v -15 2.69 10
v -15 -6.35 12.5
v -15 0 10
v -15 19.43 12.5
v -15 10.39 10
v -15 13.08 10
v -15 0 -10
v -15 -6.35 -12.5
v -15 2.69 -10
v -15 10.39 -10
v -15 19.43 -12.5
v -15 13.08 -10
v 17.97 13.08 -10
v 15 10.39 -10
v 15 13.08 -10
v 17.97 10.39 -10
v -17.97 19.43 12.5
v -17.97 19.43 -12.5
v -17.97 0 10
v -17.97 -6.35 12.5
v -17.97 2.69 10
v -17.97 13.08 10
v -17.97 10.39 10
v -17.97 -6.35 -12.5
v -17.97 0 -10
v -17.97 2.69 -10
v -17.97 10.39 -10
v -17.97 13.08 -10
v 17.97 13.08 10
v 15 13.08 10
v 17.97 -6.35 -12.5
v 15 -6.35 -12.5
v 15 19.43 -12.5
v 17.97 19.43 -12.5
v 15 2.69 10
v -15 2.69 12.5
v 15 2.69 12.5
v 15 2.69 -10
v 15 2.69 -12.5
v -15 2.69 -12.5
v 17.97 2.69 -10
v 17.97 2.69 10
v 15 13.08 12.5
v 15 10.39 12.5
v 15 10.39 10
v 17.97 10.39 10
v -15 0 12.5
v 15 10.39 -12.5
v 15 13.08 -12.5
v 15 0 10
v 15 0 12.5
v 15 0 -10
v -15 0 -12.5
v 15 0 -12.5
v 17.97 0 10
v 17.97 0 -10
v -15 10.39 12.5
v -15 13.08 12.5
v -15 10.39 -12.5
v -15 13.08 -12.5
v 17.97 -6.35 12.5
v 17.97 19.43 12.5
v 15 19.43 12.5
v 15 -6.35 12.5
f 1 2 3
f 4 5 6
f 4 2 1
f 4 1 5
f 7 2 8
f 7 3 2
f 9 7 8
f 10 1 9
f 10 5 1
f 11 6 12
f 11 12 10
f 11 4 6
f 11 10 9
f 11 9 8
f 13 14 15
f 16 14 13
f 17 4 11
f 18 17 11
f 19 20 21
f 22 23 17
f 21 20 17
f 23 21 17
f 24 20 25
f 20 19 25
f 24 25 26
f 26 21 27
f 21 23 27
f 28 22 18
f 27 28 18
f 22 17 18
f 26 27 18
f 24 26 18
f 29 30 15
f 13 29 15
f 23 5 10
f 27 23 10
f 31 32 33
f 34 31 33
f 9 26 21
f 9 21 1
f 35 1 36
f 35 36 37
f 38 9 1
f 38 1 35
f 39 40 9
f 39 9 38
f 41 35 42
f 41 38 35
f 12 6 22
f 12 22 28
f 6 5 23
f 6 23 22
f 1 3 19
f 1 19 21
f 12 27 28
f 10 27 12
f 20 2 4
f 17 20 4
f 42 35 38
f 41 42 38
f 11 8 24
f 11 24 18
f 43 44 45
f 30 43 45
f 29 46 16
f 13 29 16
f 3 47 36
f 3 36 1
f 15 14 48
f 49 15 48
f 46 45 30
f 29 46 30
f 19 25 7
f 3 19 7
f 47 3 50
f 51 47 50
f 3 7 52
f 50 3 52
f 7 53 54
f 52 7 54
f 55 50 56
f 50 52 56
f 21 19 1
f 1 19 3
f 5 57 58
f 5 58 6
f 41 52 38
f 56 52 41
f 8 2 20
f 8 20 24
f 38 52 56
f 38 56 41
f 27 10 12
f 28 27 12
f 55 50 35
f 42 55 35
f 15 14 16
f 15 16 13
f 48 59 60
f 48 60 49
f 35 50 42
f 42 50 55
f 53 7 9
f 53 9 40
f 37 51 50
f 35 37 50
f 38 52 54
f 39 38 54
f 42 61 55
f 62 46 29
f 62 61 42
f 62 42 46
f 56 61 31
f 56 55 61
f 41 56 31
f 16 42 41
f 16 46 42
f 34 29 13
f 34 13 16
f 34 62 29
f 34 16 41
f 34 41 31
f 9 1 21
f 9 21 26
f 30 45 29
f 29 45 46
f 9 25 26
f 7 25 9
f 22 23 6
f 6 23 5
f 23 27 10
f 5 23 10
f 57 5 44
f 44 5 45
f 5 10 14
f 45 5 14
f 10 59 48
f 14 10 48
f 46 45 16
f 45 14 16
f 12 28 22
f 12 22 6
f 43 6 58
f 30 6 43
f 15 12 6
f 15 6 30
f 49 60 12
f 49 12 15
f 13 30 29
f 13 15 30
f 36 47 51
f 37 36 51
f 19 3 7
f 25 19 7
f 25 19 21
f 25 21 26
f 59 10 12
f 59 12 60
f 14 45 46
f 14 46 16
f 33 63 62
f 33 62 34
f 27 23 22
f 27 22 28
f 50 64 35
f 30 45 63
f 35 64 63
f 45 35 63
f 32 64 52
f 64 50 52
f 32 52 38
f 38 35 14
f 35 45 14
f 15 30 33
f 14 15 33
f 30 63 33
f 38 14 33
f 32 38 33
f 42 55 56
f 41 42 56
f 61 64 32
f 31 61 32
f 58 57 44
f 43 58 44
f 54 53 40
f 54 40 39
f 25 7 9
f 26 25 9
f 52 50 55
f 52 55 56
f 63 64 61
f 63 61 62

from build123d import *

# Parameters (mm, degrees)
SKETCH2_W           = 30
SKETCH2_H           = 25
SKETCH2_W_2         = 2.97
SKETCH2_H_2         = 20
BOSS_EXTRUDE3_DEPTH = 2.69
BOSS_EXTRUDE4_START = 10.39
SKETCH2_3_W         = 2.97
SKETCH2_3_H         = 20
SKETCH2_3_W_2       = 30
SKETCH2_3_H_2       = 25
BOSS_EXTRUDE4_DEPTH = 2.69
SKETCH4_W           = 25
SKETCH4_H           = 25.78
SKETCH4_W_2         = 20
SKETCH4_H_2         = 2.69
BOSS_EXTRUDE5_DEPTH = 2.97


with BuildPart() as part:
    # Sketch2 → Boss-Extrude3 (new body)
    with BuildSketch(Plane(origin=(0, 0, 0), x_dir=(1, 0, 0), z_dir=(0, 1, 0))):
        Rectangle(SKETCH2_W, SKETCH2_H)
        with Locations((-16.485, 0)):
            Rectangle(SKETCH2_W_2, SKETCH2_H_2)
        with Locations((16.485, 0)):
            Rectangle(SKETCH2_W_2, SKETCH2_H_2)
    extrude(amount=BOSS_EXTRUDE3_DEPTH)


with BuildPart() as body_2:
    # Sketch2<3> → Boss-Extrude4 (new body)
    with BuildSketch(Plane(origin=(0, 0, 0), x_dir=(1, 0, 0), z_dir=(0, 1, 0)).offset(BOSS_EXTRUDE4_START)):
        with Locations((-16.485, 0)):
            Rectangle(SKETCH2_3_W, SKETCH2_3_H)
        Rectangle(SKETCH2_3_W_2, SKETCH2_3_H_2)
        with Locations((16.485, 0)):
            Rectangle(SKETCH2_3_W, SKETCH2_3_H)
    extrude(amount=BOSS_EXTRUDE4_DEPTH)


with BuildPart() as body_3:
    # Sketch4 → Boss-Extrude5 (new body)
    with BuildSketch(Plane(origin=(15, 0, 0), x_dir=(0, 0, -1), z_dir=(1, 0, 0))):
        with Locations((0, 6.54)):
            Rectangle(SKETCH4_W, SKETCH4_H)
        with Locations((0, 11.735)):
            Rectangle(SKETCH4_W_2, SKETCH4_H_2, mode=Mode.SUBTRACT)
        with Locations((0, 1.345)):
            Rectangle(SKETCH4_W_2, SKETCH4_H_2, mode=Mode.SUBTRACT)
    extrude(amount=BOSS_EXTRUDE5_DEPTH)


with BuildPart() as body_4:
    # Mirror1: mirrored copy
    add(body_3.part.mirror(Plane(origin=(0, 0, 0), x_dir=(0, 0, 1), z_dir=(1, 0, 0))))


solid = Compound([part.part, body_2.part, body_3.part, body_4.part])
